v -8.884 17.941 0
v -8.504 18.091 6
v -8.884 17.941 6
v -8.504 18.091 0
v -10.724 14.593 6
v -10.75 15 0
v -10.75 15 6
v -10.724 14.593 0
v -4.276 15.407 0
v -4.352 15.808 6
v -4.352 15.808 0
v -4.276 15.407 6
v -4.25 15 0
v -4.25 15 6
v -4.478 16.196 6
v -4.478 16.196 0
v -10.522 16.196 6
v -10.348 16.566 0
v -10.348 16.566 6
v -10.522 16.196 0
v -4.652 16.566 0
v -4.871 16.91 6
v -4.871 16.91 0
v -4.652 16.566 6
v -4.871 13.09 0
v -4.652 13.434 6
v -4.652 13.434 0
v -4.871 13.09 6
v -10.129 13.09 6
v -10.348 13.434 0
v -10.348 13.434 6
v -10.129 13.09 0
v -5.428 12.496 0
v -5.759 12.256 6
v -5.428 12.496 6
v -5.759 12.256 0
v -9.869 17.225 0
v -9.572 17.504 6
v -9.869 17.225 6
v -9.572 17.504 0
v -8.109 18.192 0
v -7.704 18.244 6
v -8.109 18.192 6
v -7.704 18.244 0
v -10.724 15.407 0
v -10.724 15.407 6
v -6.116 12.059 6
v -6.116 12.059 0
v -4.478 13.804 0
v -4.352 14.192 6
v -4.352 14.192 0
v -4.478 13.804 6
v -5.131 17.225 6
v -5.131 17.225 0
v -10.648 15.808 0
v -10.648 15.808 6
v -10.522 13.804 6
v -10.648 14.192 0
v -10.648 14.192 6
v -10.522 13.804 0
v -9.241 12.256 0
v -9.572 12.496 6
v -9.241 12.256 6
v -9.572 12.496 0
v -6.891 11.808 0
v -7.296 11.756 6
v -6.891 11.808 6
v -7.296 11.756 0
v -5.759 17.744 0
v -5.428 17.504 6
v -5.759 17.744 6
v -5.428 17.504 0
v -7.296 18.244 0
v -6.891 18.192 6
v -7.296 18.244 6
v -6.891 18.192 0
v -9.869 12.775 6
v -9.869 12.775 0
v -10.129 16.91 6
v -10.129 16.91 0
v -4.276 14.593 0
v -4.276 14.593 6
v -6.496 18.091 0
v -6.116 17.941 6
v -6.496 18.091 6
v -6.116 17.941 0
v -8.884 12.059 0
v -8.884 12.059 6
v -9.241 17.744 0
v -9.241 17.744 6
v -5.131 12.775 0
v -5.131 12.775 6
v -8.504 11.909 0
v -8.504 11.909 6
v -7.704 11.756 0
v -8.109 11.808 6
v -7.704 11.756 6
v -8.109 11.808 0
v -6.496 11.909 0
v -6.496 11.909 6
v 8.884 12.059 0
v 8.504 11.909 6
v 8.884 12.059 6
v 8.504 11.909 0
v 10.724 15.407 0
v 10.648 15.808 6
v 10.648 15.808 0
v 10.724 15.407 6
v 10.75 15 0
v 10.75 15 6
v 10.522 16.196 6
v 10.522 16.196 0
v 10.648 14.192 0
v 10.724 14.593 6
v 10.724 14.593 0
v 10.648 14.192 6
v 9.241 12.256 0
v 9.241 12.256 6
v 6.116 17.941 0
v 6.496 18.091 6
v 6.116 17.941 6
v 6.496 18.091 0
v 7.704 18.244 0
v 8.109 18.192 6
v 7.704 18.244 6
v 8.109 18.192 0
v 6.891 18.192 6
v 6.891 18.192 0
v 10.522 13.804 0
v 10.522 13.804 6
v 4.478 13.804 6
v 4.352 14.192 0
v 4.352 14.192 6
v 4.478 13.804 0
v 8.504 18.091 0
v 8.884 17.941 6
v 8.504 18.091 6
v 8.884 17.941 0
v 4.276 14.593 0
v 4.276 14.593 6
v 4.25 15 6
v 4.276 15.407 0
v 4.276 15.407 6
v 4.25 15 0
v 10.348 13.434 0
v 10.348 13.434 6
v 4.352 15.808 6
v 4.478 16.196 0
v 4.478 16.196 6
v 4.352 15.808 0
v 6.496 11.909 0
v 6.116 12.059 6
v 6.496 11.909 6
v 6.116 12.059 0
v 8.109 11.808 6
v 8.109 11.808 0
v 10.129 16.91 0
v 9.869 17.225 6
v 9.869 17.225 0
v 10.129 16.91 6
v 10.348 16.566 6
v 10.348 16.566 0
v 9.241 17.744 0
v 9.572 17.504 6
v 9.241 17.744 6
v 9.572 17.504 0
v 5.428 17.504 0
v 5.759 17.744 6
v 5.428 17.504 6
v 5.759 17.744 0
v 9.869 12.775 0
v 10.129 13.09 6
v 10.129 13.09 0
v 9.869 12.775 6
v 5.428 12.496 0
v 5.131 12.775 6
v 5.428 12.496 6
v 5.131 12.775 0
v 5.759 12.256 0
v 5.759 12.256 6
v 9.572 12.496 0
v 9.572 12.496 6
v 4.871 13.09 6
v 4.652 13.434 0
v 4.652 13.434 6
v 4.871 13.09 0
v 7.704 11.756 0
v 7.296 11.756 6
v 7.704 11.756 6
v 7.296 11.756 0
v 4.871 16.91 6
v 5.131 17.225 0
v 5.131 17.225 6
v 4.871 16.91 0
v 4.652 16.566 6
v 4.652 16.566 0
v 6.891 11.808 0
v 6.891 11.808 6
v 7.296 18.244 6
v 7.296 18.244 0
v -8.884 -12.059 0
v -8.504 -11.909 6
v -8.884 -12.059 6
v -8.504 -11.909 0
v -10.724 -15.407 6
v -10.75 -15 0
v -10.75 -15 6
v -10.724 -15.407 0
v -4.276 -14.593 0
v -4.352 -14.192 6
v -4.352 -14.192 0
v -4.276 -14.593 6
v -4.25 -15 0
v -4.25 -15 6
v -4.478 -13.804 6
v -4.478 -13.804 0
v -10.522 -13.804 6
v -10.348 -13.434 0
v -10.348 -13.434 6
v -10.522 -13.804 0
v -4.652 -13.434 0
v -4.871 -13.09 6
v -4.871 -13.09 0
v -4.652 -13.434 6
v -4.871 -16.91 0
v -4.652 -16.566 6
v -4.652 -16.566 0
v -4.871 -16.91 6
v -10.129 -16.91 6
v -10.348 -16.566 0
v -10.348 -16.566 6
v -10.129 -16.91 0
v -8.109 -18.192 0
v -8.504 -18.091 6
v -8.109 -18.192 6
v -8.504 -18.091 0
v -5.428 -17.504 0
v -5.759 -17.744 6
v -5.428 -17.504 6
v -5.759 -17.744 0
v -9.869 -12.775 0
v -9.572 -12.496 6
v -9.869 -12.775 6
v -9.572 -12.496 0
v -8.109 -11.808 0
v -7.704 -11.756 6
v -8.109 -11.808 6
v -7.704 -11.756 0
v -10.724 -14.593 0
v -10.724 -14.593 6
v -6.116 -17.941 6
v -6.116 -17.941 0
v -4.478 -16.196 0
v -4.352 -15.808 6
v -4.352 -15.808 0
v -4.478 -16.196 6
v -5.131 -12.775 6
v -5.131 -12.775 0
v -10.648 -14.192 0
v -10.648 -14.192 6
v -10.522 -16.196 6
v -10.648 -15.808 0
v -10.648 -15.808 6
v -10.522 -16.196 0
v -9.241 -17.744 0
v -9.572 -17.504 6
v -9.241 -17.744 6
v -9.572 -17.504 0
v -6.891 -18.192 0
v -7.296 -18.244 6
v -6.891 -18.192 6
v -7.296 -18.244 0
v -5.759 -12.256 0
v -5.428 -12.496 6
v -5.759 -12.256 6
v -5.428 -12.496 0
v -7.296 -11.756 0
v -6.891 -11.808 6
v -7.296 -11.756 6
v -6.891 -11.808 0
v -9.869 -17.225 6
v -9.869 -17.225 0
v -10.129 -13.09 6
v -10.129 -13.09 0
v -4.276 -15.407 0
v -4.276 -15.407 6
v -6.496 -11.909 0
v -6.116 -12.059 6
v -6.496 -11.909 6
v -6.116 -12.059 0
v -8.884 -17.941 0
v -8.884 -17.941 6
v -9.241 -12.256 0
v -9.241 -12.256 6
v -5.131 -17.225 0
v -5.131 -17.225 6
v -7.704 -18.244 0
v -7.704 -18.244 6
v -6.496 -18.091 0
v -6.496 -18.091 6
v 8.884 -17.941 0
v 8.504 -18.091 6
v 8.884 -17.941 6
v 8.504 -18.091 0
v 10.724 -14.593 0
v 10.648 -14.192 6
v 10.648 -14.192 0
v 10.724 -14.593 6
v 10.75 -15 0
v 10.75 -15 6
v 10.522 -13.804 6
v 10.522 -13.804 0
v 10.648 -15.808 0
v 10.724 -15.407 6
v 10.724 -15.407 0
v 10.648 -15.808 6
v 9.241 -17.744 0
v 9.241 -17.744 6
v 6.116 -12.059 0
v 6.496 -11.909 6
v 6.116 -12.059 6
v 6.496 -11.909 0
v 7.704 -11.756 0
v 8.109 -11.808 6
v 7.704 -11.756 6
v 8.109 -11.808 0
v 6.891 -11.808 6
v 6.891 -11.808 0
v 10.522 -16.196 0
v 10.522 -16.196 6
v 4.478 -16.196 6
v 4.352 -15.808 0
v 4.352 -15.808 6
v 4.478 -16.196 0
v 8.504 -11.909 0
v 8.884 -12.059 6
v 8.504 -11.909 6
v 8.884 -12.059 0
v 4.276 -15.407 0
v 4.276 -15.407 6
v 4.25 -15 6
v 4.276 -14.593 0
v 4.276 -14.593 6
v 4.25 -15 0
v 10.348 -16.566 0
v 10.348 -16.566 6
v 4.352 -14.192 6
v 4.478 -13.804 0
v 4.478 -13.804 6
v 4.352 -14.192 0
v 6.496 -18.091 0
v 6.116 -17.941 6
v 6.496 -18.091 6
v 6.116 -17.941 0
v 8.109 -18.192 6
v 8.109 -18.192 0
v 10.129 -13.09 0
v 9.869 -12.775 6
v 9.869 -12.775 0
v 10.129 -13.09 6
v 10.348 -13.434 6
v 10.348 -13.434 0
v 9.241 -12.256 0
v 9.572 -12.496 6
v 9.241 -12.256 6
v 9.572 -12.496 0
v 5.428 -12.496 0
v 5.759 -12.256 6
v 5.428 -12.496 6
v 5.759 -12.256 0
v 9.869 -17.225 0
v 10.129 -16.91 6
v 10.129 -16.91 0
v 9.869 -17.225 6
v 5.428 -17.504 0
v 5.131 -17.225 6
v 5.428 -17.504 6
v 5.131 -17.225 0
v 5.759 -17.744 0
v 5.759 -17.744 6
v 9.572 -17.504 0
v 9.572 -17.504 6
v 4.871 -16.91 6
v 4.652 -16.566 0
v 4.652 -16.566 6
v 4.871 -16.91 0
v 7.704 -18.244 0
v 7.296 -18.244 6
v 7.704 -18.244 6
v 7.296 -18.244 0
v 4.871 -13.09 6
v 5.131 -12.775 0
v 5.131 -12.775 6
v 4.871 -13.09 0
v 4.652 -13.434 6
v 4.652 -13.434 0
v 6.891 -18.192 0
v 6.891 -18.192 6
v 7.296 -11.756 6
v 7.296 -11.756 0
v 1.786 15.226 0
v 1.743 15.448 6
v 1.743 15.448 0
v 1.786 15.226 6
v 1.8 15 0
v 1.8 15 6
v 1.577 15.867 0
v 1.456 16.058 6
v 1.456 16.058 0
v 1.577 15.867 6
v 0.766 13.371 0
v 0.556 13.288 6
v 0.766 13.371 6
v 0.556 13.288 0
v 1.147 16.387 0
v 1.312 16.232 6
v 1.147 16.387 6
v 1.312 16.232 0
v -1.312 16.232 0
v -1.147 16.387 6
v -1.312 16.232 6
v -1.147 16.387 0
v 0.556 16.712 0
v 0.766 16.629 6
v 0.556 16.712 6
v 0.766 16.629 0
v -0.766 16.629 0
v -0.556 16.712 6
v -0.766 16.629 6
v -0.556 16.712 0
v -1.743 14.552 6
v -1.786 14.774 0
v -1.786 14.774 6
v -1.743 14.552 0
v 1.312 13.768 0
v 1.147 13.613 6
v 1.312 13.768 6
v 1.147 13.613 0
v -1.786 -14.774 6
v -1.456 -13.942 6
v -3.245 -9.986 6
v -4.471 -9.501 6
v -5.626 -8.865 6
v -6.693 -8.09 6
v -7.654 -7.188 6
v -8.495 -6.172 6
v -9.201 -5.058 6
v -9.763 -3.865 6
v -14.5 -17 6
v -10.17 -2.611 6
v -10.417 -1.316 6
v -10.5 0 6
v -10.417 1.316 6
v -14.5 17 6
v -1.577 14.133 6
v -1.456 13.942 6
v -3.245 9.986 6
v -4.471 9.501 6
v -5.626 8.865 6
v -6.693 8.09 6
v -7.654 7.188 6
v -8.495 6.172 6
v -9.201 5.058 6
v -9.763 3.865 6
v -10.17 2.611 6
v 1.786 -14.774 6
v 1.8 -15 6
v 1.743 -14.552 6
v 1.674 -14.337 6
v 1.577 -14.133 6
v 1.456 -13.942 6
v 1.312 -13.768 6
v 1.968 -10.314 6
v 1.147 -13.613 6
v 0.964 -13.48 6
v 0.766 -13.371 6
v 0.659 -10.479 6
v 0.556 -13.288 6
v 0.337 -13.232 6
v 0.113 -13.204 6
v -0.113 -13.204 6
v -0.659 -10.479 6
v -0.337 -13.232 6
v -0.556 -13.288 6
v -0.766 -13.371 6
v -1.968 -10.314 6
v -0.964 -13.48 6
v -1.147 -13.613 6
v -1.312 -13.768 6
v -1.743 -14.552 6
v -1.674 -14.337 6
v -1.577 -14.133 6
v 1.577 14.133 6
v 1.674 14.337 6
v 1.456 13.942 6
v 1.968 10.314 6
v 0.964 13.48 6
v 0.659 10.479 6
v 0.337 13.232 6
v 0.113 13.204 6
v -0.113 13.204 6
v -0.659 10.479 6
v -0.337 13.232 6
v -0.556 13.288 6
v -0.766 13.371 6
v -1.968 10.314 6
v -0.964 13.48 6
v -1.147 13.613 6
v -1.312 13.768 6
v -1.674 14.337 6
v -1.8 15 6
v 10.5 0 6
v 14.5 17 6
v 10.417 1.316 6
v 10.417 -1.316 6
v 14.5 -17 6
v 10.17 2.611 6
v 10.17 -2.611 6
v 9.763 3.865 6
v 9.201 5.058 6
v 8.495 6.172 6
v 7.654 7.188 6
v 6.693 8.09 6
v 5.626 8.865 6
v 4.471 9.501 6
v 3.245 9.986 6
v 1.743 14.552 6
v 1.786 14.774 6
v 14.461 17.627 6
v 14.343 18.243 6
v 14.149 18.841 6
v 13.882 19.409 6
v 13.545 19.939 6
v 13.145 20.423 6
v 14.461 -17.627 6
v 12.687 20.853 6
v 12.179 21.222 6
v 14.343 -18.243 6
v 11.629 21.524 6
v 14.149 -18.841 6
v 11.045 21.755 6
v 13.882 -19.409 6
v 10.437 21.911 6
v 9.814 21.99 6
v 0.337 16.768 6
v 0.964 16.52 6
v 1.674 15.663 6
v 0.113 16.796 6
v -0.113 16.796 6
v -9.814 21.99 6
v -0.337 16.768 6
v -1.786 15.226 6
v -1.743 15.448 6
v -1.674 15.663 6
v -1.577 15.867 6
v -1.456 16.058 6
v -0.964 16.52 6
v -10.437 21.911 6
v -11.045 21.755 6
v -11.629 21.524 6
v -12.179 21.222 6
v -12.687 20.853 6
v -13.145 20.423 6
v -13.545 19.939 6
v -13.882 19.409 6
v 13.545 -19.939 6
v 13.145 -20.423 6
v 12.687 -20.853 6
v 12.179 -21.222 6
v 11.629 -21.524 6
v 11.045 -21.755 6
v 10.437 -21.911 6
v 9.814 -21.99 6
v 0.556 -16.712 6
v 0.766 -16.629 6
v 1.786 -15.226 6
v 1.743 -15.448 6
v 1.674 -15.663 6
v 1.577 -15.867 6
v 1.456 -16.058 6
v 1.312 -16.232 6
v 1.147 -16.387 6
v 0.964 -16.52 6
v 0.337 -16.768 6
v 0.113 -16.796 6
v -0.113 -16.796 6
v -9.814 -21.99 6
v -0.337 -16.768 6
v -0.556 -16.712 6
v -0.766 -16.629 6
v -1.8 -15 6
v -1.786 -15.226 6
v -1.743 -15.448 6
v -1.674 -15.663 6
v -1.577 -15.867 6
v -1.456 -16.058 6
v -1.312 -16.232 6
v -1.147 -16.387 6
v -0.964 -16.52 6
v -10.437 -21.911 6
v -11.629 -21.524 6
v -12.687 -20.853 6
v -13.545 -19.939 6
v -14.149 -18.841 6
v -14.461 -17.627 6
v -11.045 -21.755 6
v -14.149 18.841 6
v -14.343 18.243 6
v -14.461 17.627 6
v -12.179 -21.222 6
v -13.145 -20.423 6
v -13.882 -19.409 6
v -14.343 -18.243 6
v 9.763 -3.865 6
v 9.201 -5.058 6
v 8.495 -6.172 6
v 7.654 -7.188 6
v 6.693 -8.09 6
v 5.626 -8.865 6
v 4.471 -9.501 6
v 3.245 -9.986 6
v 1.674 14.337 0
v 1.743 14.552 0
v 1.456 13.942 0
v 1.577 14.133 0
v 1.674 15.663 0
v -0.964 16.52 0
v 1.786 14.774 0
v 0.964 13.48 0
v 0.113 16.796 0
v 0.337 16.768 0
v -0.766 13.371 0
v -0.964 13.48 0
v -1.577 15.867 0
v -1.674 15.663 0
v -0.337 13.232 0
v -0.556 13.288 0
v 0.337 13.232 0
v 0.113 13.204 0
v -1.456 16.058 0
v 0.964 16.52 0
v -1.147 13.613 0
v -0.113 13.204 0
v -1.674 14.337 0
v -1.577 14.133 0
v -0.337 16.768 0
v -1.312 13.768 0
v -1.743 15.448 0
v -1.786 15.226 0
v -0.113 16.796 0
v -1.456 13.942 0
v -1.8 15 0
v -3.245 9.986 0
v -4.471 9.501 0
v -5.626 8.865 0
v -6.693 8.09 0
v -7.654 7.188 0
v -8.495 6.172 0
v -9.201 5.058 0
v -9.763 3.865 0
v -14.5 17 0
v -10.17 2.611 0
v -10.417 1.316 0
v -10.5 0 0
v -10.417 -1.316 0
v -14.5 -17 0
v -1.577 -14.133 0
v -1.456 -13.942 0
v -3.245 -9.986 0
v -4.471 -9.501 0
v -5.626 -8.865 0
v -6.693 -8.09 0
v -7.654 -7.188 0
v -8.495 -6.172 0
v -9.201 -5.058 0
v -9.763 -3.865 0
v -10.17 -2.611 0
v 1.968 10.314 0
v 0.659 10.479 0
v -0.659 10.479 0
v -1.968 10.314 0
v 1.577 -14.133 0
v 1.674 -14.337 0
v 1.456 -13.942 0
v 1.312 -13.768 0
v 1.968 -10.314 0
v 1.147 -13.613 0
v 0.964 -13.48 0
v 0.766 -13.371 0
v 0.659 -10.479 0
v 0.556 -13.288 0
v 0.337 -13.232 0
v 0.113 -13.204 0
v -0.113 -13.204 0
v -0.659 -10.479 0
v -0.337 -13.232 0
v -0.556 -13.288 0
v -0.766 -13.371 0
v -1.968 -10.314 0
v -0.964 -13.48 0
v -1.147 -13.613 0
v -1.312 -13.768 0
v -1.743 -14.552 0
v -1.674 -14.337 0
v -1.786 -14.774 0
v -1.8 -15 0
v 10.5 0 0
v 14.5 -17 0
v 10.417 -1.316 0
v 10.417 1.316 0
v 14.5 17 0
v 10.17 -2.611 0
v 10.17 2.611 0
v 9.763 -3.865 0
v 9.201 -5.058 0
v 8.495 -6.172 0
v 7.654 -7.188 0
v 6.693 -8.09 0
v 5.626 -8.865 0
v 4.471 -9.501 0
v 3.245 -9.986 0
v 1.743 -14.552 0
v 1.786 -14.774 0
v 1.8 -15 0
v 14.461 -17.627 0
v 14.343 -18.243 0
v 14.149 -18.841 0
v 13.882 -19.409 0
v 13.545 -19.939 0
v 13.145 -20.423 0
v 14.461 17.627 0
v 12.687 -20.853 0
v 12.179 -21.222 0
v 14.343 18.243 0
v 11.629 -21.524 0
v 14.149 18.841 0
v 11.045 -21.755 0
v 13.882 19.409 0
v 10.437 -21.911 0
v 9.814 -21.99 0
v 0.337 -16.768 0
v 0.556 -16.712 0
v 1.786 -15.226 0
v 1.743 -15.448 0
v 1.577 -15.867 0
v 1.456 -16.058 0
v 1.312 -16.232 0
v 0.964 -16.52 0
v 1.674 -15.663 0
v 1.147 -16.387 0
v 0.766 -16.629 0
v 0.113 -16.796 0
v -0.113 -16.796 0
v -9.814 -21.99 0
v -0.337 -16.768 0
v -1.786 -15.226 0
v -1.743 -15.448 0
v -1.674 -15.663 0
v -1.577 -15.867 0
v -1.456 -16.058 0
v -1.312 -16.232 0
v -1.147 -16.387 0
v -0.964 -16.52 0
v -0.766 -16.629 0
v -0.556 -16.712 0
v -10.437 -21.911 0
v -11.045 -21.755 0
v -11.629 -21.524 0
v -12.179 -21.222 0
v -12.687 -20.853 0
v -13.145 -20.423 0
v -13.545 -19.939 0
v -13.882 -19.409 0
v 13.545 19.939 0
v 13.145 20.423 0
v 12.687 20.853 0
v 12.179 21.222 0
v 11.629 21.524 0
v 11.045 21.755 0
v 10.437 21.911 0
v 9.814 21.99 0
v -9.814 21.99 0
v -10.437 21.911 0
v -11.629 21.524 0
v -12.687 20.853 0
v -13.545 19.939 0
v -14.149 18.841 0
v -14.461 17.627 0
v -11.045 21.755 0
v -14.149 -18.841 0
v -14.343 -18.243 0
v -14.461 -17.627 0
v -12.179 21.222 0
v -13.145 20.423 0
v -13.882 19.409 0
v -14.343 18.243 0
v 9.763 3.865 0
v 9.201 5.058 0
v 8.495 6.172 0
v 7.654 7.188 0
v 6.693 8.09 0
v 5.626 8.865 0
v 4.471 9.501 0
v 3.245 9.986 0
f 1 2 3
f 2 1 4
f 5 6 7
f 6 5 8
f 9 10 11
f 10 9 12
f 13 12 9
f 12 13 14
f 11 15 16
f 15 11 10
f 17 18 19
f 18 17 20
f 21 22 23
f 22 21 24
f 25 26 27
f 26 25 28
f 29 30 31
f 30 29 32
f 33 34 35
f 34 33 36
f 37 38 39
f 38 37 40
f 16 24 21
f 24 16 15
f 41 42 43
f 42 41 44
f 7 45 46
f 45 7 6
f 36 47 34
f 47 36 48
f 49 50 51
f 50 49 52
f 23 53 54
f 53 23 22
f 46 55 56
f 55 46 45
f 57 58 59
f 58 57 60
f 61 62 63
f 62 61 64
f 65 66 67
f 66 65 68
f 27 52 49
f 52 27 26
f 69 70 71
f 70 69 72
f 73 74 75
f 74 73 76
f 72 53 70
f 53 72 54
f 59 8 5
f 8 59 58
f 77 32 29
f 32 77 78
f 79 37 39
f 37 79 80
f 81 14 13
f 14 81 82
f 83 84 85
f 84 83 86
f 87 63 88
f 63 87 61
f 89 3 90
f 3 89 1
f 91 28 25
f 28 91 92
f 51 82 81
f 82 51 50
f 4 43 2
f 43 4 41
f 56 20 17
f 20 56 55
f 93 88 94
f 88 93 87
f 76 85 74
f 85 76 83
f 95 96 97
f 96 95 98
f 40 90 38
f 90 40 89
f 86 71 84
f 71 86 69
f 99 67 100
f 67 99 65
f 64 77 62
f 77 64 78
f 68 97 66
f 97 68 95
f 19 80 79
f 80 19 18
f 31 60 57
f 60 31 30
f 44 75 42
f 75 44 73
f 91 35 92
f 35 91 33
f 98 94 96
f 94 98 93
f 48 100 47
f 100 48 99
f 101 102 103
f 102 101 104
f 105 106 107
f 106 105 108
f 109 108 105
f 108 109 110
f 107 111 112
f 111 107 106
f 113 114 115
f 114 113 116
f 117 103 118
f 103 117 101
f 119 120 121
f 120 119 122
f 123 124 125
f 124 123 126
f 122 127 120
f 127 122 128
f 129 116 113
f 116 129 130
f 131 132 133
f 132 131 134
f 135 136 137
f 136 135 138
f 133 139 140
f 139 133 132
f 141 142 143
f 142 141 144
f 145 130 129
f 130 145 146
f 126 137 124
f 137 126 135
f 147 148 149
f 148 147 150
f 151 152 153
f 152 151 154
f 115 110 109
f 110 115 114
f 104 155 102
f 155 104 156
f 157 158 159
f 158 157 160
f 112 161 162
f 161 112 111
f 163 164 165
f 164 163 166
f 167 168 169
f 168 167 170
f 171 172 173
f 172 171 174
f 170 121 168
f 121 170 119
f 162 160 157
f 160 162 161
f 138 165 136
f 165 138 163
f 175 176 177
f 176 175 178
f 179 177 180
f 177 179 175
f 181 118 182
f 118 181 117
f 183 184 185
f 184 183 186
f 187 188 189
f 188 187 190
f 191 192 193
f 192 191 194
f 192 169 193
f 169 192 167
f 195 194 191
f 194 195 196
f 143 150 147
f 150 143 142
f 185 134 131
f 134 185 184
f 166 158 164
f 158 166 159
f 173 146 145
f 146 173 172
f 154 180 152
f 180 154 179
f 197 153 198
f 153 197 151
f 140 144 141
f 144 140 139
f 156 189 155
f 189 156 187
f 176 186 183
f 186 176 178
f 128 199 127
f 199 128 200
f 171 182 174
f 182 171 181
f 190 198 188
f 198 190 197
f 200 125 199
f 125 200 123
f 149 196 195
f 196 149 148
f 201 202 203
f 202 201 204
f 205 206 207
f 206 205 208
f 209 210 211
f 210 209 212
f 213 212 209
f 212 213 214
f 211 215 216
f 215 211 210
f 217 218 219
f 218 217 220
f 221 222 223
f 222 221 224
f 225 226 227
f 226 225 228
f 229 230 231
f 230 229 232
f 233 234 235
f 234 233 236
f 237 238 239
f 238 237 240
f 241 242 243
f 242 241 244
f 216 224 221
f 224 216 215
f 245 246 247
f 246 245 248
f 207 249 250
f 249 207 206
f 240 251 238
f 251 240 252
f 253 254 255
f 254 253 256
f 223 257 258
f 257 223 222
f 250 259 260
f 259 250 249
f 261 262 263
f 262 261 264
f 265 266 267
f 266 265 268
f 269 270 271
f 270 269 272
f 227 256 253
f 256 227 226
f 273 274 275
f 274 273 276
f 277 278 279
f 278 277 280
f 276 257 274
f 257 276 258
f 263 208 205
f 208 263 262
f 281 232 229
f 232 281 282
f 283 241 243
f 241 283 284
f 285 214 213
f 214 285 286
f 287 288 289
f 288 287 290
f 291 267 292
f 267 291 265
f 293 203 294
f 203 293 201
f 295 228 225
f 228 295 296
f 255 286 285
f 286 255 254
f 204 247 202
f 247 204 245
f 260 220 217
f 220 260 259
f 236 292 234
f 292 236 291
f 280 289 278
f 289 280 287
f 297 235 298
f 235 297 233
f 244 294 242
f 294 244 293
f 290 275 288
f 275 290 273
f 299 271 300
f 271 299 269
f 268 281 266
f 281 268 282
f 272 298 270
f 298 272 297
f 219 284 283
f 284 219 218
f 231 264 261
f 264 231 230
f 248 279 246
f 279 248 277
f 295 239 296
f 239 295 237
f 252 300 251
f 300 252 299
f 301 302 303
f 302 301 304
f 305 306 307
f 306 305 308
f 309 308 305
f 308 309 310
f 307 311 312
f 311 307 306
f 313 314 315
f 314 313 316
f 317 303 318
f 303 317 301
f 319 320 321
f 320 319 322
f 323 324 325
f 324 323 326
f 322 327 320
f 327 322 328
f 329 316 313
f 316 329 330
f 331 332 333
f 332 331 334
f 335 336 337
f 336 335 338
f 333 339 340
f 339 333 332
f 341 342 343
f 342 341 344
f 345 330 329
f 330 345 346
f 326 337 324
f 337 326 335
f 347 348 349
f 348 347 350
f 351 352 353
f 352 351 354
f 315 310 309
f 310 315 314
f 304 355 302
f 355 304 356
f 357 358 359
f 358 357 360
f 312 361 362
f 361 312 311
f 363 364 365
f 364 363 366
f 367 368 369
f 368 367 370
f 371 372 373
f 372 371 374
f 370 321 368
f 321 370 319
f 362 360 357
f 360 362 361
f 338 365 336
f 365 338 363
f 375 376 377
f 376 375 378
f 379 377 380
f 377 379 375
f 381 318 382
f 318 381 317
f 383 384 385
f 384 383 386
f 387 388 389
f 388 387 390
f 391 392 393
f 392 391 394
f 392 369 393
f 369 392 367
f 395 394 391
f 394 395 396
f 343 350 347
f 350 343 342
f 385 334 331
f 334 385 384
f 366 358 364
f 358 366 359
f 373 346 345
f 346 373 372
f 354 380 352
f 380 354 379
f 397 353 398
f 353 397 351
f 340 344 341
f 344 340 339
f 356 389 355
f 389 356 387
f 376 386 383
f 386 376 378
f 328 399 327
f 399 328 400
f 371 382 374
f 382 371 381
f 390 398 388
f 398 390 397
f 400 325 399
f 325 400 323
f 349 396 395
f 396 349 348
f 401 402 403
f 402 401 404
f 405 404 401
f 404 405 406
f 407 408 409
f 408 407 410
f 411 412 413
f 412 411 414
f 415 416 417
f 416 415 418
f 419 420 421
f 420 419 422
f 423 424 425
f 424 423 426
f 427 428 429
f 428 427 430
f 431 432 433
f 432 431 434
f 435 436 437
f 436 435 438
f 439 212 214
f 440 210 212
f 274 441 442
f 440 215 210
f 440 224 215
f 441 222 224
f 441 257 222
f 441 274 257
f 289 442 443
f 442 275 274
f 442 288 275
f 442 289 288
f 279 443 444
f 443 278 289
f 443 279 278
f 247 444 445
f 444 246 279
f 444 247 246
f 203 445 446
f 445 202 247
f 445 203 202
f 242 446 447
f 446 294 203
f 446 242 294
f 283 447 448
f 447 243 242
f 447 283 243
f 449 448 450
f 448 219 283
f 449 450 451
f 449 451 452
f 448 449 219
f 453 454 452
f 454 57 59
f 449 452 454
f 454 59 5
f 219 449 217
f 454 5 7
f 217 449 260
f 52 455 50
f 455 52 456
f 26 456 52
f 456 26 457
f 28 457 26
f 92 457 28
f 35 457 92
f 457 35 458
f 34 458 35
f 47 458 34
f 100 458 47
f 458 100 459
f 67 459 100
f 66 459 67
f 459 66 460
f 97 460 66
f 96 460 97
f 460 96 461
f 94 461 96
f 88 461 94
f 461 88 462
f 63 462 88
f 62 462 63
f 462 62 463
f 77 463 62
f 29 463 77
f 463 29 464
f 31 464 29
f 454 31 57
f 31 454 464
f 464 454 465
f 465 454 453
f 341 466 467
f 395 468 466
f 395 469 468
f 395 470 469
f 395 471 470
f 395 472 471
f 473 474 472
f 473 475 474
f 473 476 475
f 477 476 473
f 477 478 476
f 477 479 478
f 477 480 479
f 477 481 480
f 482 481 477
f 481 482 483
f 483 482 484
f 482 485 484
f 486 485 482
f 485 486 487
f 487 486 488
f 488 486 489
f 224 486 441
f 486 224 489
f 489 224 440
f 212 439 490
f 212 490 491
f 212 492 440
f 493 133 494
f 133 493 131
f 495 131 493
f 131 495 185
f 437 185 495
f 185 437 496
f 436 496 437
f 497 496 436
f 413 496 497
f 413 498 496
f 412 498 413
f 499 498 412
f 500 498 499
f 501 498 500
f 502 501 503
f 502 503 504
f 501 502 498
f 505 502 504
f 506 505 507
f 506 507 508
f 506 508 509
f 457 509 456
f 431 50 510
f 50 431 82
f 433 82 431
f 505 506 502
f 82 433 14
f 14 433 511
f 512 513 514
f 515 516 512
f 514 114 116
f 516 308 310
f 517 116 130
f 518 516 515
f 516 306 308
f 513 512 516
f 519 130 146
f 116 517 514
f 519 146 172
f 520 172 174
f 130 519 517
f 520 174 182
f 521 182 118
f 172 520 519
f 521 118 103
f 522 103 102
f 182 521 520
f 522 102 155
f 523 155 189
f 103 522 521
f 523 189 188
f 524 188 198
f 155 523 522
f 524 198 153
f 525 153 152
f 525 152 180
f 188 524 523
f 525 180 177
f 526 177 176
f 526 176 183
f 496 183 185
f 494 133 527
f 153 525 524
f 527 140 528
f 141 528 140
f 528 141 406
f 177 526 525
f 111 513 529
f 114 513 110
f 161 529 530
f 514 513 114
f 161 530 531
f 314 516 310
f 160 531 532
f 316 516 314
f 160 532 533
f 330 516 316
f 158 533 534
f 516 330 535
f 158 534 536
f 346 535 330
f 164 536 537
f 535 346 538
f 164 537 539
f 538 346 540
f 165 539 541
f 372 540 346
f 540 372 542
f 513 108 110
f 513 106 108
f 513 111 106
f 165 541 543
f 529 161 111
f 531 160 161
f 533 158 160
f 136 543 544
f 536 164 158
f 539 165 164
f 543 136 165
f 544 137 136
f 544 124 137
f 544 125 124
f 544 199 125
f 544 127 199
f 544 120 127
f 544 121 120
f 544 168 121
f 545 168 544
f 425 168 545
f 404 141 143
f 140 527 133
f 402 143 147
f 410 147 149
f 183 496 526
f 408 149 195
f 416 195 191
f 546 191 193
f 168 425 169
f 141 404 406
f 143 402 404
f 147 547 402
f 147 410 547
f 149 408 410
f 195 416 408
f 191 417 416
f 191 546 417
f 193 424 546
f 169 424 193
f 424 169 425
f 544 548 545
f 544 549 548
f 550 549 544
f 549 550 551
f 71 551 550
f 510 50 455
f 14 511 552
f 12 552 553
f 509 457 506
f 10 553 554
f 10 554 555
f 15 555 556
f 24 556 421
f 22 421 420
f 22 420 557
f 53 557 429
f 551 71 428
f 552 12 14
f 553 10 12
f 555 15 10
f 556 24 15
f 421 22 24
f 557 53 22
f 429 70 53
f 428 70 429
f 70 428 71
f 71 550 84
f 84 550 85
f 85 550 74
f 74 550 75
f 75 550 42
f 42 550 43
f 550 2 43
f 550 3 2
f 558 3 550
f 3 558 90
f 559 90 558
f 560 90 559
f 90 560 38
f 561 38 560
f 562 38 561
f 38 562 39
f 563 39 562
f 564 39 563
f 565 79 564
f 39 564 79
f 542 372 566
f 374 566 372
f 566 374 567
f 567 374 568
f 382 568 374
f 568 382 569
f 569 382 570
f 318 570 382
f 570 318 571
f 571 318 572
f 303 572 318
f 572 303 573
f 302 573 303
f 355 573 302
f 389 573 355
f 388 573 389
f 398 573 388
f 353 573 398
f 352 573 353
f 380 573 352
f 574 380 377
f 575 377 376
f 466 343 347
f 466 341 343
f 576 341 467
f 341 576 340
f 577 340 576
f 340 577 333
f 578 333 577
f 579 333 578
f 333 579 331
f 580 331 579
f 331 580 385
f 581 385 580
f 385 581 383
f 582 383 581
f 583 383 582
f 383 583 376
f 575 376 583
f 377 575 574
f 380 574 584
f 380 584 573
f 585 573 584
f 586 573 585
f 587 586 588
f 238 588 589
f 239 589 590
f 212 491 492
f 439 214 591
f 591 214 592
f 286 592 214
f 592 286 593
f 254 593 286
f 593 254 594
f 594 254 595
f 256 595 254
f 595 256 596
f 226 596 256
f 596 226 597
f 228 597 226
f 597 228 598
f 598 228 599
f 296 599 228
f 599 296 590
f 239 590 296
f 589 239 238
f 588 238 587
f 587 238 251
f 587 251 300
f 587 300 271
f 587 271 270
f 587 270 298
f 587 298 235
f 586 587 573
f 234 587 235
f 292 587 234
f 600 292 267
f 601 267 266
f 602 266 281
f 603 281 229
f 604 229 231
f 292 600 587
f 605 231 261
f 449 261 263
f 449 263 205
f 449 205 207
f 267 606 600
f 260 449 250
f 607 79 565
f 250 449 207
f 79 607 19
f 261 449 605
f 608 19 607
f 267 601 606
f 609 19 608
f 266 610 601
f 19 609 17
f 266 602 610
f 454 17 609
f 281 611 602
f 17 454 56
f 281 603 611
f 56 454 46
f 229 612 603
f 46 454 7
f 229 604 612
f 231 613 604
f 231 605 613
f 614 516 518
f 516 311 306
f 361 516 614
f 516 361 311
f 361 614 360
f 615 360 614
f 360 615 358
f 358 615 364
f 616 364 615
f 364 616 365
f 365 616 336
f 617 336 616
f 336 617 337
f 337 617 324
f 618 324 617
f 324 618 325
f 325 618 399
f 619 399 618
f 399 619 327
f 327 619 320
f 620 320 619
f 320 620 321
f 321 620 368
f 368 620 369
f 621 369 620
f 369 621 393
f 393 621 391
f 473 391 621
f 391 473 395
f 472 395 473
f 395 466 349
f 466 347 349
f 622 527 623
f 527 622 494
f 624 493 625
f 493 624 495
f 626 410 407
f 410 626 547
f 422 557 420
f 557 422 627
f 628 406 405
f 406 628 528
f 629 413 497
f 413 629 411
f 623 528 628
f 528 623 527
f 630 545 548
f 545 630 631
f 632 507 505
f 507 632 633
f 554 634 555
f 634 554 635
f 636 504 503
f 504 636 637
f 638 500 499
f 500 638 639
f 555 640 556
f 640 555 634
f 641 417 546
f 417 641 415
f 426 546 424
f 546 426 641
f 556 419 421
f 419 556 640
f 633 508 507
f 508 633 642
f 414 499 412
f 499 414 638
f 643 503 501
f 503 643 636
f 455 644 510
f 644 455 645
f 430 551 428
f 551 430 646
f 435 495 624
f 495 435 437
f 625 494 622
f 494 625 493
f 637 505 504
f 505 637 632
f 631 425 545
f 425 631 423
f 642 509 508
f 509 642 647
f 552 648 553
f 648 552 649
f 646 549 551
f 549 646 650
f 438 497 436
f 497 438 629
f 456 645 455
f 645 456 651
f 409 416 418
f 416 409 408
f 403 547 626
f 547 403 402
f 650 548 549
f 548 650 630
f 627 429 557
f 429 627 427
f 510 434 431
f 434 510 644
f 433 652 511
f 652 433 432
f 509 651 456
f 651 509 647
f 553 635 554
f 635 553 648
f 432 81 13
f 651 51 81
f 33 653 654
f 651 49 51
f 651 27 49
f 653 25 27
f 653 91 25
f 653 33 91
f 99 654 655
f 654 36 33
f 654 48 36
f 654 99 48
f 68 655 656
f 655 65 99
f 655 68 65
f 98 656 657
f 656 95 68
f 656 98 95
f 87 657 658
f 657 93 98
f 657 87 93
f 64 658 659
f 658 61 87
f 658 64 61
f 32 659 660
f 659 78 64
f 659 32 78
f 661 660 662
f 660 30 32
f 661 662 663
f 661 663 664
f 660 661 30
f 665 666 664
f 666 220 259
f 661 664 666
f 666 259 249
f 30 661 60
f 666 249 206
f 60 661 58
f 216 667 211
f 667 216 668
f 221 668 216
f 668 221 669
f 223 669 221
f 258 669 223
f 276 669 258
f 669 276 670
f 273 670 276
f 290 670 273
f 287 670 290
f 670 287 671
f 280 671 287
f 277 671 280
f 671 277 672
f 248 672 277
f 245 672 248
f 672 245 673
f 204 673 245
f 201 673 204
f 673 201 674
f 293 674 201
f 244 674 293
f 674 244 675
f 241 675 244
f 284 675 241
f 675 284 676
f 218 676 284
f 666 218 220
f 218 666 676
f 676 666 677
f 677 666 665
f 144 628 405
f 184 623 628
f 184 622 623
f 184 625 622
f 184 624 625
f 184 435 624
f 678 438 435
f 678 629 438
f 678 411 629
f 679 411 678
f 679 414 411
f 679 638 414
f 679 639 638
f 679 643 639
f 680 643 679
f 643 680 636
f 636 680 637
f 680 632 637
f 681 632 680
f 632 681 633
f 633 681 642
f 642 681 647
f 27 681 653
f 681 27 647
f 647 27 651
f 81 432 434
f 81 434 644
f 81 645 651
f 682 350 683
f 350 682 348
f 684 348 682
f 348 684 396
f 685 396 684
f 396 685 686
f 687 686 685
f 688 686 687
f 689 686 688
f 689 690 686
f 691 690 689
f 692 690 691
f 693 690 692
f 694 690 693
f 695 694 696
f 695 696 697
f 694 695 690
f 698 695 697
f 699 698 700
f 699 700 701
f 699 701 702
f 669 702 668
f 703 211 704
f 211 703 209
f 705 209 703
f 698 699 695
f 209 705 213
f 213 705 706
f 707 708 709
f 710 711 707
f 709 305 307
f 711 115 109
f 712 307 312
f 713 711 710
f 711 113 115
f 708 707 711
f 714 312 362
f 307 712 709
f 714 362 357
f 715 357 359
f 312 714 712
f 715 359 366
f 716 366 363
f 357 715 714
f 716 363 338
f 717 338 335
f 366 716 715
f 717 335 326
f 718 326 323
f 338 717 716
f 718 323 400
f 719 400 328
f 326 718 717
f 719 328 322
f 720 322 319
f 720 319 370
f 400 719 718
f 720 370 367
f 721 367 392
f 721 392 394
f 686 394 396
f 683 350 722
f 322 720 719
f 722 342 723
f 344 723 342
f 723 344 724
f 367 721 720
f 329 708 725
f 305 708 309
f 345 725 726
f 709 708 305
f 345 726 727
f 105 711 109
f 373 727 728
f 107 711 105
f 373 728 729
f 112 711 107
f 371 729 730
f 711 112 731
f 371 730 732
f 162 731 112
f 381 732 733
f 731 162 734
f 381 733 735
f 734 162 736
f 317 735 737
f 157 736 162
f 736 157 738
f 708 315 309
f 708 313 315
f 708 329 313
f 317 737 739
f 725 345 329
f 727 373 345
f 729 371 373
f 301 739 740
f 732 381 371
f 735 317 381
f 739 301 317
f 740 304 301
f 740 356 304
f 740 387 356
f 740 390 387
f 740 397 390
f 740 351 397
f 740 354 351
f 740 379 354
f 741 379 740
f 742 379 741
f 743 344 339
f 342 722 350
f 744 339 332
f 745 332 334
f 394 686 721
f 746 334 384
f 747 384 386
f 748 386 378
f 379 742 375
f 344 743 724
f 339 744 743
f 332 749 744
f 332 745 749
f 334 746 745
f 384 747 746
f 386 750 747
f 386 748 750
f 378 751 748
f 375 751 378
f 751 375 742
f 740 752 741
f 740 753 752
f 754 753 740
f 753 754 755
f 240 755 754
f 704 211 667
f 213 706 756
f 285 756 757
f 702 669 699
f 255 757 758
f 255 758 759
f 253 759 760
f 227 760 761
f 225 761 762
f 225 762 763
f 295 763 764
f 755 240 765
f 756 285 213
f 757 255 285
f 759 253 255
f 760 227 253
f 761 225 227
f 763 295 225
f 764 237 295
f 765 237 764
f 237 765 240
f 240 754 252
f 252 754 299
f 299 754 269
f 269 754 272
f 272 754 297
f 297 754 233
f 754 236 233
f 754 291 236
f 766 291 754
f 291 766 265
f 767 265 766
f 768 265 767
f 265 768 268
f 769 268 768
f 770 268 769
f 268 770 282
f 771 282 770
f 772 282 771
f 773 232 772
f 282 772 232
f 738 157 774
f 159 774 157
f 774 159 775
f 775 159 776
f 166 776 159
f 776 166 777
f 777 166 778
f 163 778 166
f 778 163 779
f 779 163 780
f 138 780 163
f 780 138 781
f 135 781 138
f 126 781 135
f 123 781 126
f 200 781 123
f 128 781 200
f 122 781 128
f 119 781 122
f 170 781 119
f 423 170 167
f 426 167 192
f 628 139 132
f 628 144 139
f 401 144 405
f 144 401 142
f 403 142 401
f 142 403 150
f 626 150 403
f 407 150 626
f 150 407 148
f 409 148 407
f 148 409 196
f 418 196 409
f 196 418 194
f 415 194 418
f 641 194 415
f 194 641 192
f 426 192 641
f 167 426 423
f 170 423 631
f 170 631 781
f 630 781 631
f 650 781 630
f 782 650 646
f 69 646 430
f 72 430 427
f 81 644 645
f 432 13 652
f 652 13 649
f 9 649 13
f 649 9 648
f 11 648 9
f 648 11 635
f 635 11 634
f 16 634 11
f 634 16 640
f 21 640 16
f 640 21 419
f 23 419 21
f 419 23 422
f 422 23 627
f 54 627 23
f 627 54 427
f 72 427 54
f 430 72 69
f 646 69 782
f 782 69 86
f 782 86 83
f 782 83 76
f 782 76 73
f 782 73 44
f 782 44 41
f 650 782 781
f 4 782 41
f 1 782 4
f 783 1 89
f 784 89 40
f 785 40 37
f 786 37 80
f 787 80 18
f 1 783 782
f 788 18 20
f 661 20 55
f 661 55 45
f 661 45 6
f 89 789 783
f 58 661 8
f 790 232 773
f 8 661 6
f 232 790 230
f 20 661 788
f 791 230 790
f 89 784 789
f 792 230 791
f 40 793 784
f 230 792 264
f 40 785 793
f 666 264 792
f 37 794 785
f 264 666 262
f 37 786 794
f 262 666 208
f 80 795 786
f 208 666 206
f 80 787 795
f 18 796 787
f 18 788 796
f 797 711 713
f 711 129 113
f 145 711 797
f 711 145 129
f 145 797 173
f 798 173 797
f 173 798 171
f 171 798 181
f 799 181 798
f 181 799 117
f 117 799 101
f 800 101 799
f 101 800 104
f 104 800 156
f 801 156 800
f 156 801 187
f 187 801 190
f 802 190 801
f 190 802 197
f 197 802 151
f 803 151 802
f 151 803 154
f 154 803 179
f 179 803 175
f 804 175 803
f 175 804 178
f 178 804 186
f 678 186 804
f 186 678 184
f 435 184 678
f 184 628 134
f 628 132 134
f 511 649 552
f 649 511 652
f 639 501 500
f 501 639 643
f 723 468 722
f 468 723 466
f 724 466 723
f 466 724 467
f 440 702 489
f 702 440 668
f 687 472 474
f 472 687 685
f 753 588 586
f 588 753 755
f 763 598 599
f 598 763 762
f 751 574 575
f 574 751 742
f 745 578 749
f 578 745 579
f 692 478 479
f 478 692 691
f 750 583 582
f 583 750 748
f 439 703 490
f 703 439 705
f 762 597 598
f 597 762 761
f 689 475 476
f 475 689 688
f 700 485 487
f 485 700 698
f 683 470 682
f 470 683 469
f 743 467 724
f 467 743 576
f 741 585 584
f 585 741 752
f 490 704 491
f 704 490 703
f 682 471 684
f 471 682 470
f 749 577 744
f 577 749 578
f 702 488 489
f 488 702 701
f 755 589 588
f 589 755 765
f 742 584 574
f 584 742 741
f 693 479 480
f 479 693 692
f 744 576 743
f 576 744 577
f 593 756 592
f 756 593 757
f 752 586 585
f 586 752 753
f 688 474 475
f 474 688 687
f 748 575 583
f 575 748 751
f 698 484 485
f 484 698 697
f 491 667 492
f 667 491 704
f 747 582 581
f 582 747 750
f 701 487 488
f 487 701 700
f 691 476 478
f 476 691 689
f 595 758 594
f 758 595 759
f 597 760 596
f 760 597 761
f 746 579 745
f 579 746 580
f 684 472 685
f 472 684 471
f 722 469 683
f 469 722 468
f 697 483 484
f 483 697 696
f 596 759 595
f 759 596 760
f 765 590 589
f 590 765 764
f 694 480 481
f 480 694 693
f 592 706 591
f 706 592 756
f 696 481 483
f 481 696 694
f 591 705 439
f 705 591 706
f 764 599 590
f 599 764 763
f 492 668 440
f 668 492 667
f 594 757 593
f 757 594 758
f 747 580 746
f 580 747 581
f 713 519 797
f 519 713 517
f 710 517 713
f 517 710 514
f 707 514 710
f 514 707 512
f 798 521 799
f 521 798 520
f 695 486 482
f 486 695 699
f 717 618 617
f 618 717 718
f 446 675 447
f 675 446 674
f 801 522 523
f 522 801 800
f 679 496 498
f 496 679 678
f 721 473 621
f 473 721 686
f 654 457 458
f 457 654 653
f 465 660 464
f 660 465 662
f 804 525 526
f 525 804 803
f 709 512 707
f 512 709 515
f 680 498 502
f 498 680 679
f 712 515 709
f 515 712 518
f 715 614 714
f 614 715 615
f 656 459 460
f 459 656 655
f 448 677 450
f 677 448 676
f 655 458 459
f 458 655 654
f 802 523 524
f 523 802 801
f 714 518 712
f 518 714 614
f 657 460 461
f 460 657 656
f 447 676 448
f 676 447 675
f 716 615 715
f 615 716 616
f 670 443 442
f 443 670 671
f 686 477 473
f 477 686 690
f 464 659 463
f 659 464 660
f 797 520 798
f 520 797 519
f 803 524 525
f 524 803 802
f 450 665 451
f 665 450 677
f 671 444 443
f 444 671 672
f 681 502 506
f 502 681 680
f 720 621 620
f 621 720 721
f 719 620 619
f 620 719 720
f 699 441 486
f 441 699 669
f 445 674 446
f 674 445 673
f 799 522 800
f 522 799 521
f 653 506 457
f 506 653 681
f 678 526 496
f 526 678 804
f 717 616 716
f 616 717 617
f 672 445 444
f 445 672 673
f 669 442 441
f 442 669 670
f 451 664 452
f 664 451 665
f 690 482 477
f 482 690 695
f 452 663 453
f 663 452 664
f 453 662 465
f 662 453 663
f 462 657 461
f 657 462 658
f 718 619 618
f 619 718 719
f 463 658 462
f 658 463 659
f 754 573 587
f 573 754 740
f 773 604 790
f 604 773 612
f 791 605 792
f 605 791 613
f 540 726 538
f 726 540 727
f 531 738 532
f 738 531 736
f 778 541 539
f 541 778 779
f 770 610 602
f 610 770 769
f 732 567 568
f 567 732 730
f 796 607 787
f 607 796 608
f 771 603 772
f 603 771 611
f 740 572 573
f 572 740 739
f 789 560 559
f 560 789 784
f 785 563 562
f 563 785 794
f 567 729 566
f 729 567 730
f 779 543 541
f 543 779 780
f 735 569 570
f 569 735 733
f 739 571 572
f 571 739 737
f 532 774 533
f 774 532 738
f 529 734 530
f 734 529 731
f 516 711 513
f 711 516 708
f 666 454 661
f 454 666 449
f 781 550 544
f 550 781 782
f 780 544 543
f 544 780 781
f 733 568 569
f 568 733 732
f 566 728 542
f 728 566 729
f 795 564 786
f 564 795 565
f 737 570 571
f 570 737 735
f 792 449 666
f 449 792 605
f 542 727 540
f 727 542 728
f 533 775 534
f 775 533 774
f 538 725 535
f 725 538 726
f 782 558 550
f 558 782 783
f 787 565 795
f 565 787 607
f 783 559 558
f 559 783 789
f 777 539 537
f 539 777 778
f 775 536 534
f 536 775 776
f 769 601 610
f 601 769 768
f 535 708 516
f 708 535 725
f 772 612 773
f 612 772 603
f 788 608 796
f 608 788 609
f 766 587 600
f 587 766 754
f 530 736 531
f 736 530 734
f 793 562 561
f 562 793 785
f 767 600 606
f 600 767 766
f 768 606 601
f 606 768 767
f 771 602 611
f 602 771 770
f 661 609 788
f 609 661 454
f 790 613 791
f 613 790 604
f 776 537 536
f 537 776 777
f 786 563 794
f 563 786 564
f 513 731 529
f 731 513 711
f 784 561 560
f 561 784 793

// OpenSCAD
$fn = 50;


difference() {
	union() {
		hull() {
			translate(v = [-9.5000000000, 17.0000000000, 0]) {
				cylinder(h = 6, r = 5);
			}
			translate(v = [9.5000000000, 17.0000000000, 0]) {
				cylinder(h = 6, r = 5);
			}
			translate(v = [-9.5000000000, -17.0000000000, 0]) {
				cylinder(h = 6, r = 5);
			}
			translate(v = [9.5000000000, -17.0000000000, 0]) {
				cylinder(h = 6, r = 5);
			}
		}
	}
	union() {
		#translate(v = [-7.5000000000, 15.0000000000, 0]) {
			cylinder(h = 6, r = 3.2500000000);
		}
		#translate(v = [7.5000000000, 15.0000000000, 0]) {
			cylinder(h = 6, r = 3.2500000000);
		}
		#translate(v = [-7.5000000000, -15.0000000000, 0]) {
			cylinder(h = 6, r = 3.2500000000);
		}
		#translate(v = [7.5000000000, -15.0000000000, 0]) {
			cylinder(h = 6, r = 3.2500000000);
		}
		#translate(v = [-7.5000000000, -15.0000000000, -100.0000000000]) {
			cylinder(h = 200, r = 3.2500000000);
		}
		#translate(v = [-7.5000000000, 15.0000000000, -100.0000000000]) {
			cylinder(h = 200, r = 3.2500000000);
		}
		#translate(v = [7.5000000000, -15.0000000000, -100.0000000000]) {
			cylinder(h = 200, r = 3.2500000000);
		}
		#translate(v = [7.5000000000, 15.0000000000, -100.0000000000]) {
			cylinder(h = 200, r = 3.2500000000);
		}
		#translate(v = [-7.5000000000, 15.0000000000, 0]) {
			cylinder(h = 6, r = 1.8000000000);
		}
		#translate(v = [0.0000000000, 15.0000000000, 0]) {
			cylinder(h = 6, r = 1.8000000000);
		}
		#translate(v = [7.5000000000, 15.0000000000, 0]) {
			cylinder(h = 6, r = 1.8000000000);
		}
		#translate(v = [-7.5000000000, -15.0000000000, 0]) {
			cylinder(h = 6, r = 1.8000000000);
		}
		#translate(v = [0.0000000000, -15.0000000000, 0]) {
			cylinder(h = 6, r = 1.8000000000);
		}
		#translate(v = [7.5000000000, -15.0000000000, 0]) {
			cylinder(h = 6, r = 1.8000000000);
		}
		#translate(v = [-7.5000000000, 15.0000000000, 0]) {
			cylinder(h = 6, r = 1.8000000000);
		}
		#translate(v = [0.0000000000, 15.0000000000, 0]) {
			cylinder(h = 6, r = 1.8000000000);
		}
		#translate(v = [7.5000000000, 15.0000000000, 0]) {
			cylinder(h = 6, r = 1.8000000000);
		}
		#translate(v = [-7.5000000000, -15.0000000000, 0]) {
			cylinder(h = 6, r = 1.8000000000);
		}
		#translate(v = [0.0000000000, -15.0000000000, 0]) {
			cylinder(h = 6, r = 1.8000000000);
		}
		#translate(v = [7.5000000000, -15.0000000000, 0]) {
			cylinder(h = 6, r = 1.8000000000);
		}
		#translate(v = [-7.5000000000, 15.0000000000, 0]) {
			cylinder(h = 6, r = 1.8000000000);
		}
		#translate(v = [0.0000000000, 15.0000000000, 0]) {
			cylinder(h = 6, r = 1.8000000000);
		}
		#translate(v = [7.5000000000, 15.0000000000, 0]) {
			cylinder(h = 6, r = 1.8000000000);
		}
		#translate(v = [-7.5000000000, -15.0000000000, 0]) {
			cylinder(h = 6, r = 1.8000000000);
		}
		#translate(v = [0.0000000000, -15.0000000000, 0]) {
			cylinder(h = 6, r = 1.8000000000);
		}
		#translate(v = [7.5000000000, -15.0000000000, 0]) {
			cylinder(h = 6, r = 1.8000000000);
		}
		#cylinder(h = 6, r = 10.5000000000);
	}
}
